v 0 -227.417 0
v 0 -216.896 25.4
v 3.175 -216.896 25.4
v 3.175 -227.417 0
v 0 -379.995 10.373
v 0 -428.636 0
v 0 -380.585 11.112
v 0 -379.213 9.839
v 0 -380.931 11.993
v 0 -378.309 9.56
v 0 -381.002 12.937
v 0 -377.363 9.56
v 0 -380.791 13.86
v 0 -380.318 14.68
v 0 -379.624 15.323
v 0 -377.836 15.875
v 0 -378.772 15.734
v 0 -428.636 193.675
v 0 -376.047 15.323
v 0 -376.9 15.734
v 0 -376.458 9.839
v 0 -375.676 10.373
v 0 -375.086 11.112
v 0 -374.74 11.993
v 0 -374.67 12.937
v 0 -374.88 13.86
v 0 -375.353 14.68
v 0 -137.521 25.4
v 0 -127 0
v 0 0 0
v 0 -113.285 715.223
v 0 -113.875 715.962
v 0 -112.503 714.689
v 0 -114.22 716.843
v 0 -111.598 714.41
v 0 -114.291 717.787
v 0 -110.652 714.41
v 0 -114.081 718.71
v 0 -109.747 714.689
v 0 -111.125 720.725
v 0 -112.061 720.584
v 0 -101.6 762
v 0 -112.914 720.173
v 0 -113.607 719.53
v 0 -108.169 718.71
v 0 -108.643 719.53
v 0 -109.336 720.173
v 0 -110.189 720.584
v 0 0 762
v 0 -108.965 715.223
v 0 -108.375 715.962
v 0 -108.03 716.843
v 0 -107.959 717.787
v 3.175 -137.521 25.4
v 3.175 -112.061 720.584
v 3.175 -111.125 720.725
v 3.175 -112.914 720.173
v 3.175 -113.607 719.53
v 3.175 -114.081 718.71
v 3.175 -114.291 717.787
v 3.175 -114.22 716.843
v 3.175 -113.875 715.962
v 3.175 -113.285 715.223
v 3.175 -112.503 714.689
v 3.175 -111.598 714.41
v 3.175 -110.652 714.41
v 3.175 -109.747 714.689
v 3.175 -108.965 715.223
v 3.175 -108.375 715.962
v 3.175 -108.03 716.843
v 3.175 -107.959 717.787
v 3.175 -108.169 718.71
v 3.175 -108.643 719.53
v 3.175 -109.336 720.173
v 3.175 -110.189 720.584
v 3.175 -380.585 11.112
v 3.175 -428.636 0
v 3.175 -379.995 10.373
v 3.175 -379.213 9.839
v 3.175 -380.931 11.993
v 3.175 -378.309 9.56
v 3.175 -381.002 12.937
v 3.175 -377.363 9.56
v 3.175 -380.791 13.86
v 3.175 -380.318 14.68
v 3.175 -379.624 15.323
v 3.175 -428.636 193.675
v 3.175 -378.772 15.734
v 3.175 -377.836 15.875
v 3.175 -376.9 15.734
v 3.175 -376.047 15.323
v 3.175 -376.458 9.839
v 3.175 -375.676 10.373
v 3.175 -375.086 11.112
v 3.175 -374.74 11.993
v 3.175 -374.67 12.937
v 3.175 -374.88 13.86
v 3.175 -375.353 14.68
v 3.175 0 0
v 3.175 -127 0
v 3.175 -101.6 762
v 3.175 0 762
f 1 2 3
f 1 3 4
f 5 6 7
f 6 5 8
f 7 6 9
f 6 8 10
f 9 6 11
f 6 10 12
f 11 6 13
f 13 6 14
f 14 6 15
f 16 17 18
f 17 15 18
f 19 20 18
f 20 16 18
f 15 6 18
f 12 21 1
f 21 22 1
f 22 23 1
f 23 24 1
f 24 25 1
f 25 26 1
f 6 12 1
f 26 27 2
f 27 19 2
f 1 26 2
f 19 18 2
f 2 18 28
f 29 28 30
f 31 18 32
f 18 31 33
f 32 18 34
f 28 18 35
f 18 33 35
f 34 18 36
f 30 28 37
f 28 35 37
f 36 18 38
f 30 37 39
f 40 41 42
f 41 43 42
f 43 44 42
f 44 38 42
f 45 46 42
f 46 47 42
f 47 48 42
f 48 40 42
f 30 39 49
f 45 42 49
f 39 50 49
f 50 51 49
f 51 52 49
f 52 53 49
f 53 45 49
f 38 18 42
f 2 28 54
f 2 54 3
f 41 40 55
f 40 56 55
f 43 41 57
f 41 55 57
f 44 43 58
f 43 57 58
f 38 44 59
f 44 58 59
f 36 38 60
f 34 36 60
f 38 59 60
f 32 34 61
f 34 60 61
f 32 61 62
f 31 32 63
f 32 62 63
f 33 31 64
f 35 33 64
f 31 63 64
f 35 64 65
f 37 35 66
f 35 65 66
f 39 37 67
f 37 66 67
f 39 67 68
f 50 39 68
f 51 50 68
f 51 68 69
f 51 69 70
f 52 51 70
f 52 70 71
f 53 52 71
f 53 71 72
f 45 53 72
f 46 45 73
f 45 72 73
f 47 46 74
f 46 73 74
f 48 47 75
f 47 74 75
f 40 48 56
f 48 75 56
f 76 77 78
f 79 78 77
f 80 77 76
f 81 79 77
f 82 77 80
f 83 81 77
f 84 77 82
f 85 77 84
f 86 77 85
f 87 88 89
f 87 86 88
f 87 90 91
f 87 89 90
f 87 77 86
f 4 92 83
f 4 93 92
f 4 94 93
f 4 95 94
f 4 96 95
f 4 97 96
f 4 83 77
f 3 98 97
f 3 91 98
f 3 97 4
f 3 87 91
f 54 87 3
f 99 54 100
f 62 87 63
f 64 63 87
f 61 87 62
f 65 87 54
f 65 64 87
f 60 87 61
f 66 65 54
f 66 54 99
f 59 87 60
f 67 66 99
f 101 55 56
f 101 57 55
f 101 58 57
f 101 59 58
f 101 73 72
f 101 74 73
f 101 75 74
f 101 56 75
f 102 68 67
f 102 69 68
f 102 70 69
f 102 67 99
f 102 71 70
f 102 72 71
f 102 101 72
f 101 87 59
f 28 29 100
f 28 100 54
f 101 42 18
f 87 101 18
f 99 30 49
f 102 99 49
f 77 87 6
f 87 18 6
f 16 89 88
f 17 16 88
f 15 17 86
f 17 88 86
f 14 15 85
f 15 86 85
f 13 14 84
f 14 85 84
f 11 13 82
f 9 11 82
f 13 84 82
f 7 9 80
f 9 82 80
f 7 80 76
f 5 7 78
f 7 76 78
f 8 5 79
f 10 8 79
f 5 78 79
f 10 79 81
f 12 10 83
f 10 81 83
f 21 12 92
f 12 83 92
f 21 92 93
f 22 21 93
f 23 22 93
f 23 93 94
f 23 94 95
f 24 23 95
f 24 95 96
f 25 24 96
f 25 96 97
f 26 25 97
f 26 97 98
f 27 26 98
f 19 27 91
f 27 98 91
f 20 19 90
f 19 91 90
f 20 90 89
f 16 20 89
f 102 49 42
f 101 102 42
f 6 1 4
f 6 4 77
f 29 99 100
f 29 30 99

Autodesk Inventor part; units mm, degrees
ref_plane "YZ Plane" through (0, 0, 0) normal (1, 0, 0) x (0, 1, 0)
ref_plane "XZ Plane" through (0, 0, 0) normal (0, 1, 0) x (-1, 0, 0)
ref_plane "XY Plane" through (0, 0, 0) normal (0, 0, 1) x (1, 0, 0)
sketch "Sketch1" plane through (0, 0, 0) normal (1, 0, 0) x (0, 1, 0)
  line L0 (0, 0) -> (-127, 0)
  line L1 (0, 0) -> (127, 0) construction
  line L2 (-227.417, 0) -> (-428.6358, 0)
  line L3 (0, 0) -> (0, 762)
  line L4 (0, 0) -> (762, 0) construction
  line L5 (0, 762) -> (-101.6, 762)
  line L6 (-101.6, 762) -> (-428.6358, 193.675)
  line L7 (-428.6358, 193.675) -> (-428.6358, 0)
  line L8 (-127, 0) -> (-137.521, 25.4)
  line L9 (-127, 0) -> (-99.5072, 0) construction
  line L10 (-137.521, 25.4) -> (-216.896, 25.4)
  line L11 (-216.896, 25.4) -> (-227.417, 0)
  dimension "d0" = 127
  dimension "d1" = 180
  dimension "d8" = 201.2188
  dimension "d10" = 762
  dimension "d11" = 90
  dimension "d13" = 90
  dimension "d14" = 90
  dimension "d18" = 112.5
  dimension "d19" = 79.375
  dimension "d20" = 112.5
  dimension "d21" = 112.5
  dimension "d22" = 25.4
  dimension "d23" = 0
  dimension "d35" = 101.6
  dimension "d36" = 193.675
extrude "Extrusion1" add sketch "Sketch1" along normal blind 3.175
sketch "Sketch2" plane through (0, 0, 0) normal (-1, 0, 0) x (0, 0, 1)
  line L0 (0, 0) -> (0, -127) projected
  line L1 (0, -127) -> (25.4, -137.521) projected
  line L2 (25.4, -137.521) -> (25.4, -216.896) projected
  line L3 (25.4, -216.896) -> (0, -227.417) projected
  line L4 (0, -227.417) -> (0, -428.6358) projected
  line L5 (0, -428.6358) -> (193.675, -428.6358) projected
  line L6 (193.675, -428.6358) -> (762, -101.6) projected
  line L7 (762, -101.6) -> (762, 0) projected
  line L8 (762, 0) -> (0, 0) projected
  point P0 (12.7, -377.8358)
  point P1 (717.55, -111.125)
  dimension "d24" = 111.125
  dimension "d25" = 44.45
  dimension "d26" = 50.8
  dimension "d27" = 12.7
hole "Hole1" at (0, -377.8358, 12.7) at (0, -111.125, 717.55) direction (1, 0, 0) diameter 6.35 end through all
properties part number "side panel" material "Polycarbonate, Clear"
